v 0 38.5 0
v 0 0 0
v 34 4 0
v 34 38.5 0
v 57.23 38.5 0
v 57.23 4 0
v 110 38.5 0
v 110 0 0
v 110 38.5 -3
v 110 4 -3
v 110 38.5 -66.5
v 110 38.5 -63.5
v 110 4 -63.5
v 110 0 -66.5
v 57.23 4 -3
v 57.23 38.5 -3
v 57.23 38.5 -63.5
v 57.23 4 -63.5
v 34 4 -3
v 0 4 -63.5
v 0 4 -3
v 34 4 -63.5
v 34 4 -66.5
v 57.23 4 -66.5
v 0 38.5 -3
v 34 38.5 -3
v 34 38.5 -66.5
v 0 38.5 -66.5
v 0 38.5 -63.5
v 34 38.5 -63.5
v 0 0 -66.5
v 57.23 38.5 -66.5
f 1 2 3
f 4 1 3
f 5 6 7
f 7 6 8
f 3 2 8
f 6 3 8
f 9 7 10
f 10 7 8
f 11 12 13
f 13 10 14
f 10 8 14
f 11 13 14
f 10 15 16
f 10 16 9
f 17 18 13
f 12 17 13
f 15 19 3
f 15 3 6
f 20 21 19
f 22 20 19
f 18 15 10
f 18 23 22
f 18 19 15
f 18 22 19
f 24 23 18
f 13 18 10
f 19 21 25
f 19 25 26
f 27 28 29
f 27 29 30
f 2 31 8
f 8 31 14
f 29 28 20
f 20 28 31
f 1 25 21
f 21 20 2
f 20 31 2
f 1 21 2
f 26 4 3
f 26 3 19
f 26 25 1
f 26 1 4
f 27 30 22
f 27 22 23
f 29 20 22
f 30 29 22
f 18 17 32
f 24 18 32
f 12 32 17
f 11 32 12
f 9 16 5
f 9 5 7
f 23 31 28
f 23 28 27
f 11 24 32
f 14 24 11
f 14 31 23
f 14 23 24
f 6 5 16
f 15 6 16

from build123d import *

# Parameters (mm, degrees)
EXTRUDE_1_DEPTH = 4
SKETCH_1_3_W    = 34
SKETCH_1_3_H    = 3
SKETCH_1_3_W_2  = 52.77
EXTRUDE_2_DEPTH = 38.5


with BuildPart() as part:
    # 草图1 → 凸台-拉伸1 (new body)
    with BuildSketch(Plane(origin=(0, 0, 0), x_dir=(1, 0, 0), z_dir=(0, 1, 0))):
        Polygon((0, 63.5), (0, 3), (34, 3), (34, 0), (57.23, 0), (57.23, 3), (110, 3), (110, 63.5), (57.23, 63.5), (57.23, 66.5), (34, 66.5), (34, 63.5), align=None)
    extrude(amount=EXTRUDE_1_DEPTH)

    # 草图1<3> → 凸台-拉伸2 (add)
    with BuildSketch(Plane(origin=(0, 0, 0), x_dir=(1, 0, 0), z_dir=(0, 1, 0))):
        with Locations((17, 1.5)):
            Rectangle(SKETCH_1_3_W, SKETCH_1_3_H)
        with Locations((17, 65)):
            Rectangle(SKETCH_1_3_W, SKETCH_1_3_H)
        with Locations((83.615, 1.5)):
            Rectangle(SKETCH_1_3_W_2, SKETCH_1_3_H)
        with Locations((83.615, 65)):
            Rectangle(SKETCH_1_3_W_2, SKETCH_1_3_H)
    extrude(amount=EXTRUDE_2_DEPTH)


solid = part.part
